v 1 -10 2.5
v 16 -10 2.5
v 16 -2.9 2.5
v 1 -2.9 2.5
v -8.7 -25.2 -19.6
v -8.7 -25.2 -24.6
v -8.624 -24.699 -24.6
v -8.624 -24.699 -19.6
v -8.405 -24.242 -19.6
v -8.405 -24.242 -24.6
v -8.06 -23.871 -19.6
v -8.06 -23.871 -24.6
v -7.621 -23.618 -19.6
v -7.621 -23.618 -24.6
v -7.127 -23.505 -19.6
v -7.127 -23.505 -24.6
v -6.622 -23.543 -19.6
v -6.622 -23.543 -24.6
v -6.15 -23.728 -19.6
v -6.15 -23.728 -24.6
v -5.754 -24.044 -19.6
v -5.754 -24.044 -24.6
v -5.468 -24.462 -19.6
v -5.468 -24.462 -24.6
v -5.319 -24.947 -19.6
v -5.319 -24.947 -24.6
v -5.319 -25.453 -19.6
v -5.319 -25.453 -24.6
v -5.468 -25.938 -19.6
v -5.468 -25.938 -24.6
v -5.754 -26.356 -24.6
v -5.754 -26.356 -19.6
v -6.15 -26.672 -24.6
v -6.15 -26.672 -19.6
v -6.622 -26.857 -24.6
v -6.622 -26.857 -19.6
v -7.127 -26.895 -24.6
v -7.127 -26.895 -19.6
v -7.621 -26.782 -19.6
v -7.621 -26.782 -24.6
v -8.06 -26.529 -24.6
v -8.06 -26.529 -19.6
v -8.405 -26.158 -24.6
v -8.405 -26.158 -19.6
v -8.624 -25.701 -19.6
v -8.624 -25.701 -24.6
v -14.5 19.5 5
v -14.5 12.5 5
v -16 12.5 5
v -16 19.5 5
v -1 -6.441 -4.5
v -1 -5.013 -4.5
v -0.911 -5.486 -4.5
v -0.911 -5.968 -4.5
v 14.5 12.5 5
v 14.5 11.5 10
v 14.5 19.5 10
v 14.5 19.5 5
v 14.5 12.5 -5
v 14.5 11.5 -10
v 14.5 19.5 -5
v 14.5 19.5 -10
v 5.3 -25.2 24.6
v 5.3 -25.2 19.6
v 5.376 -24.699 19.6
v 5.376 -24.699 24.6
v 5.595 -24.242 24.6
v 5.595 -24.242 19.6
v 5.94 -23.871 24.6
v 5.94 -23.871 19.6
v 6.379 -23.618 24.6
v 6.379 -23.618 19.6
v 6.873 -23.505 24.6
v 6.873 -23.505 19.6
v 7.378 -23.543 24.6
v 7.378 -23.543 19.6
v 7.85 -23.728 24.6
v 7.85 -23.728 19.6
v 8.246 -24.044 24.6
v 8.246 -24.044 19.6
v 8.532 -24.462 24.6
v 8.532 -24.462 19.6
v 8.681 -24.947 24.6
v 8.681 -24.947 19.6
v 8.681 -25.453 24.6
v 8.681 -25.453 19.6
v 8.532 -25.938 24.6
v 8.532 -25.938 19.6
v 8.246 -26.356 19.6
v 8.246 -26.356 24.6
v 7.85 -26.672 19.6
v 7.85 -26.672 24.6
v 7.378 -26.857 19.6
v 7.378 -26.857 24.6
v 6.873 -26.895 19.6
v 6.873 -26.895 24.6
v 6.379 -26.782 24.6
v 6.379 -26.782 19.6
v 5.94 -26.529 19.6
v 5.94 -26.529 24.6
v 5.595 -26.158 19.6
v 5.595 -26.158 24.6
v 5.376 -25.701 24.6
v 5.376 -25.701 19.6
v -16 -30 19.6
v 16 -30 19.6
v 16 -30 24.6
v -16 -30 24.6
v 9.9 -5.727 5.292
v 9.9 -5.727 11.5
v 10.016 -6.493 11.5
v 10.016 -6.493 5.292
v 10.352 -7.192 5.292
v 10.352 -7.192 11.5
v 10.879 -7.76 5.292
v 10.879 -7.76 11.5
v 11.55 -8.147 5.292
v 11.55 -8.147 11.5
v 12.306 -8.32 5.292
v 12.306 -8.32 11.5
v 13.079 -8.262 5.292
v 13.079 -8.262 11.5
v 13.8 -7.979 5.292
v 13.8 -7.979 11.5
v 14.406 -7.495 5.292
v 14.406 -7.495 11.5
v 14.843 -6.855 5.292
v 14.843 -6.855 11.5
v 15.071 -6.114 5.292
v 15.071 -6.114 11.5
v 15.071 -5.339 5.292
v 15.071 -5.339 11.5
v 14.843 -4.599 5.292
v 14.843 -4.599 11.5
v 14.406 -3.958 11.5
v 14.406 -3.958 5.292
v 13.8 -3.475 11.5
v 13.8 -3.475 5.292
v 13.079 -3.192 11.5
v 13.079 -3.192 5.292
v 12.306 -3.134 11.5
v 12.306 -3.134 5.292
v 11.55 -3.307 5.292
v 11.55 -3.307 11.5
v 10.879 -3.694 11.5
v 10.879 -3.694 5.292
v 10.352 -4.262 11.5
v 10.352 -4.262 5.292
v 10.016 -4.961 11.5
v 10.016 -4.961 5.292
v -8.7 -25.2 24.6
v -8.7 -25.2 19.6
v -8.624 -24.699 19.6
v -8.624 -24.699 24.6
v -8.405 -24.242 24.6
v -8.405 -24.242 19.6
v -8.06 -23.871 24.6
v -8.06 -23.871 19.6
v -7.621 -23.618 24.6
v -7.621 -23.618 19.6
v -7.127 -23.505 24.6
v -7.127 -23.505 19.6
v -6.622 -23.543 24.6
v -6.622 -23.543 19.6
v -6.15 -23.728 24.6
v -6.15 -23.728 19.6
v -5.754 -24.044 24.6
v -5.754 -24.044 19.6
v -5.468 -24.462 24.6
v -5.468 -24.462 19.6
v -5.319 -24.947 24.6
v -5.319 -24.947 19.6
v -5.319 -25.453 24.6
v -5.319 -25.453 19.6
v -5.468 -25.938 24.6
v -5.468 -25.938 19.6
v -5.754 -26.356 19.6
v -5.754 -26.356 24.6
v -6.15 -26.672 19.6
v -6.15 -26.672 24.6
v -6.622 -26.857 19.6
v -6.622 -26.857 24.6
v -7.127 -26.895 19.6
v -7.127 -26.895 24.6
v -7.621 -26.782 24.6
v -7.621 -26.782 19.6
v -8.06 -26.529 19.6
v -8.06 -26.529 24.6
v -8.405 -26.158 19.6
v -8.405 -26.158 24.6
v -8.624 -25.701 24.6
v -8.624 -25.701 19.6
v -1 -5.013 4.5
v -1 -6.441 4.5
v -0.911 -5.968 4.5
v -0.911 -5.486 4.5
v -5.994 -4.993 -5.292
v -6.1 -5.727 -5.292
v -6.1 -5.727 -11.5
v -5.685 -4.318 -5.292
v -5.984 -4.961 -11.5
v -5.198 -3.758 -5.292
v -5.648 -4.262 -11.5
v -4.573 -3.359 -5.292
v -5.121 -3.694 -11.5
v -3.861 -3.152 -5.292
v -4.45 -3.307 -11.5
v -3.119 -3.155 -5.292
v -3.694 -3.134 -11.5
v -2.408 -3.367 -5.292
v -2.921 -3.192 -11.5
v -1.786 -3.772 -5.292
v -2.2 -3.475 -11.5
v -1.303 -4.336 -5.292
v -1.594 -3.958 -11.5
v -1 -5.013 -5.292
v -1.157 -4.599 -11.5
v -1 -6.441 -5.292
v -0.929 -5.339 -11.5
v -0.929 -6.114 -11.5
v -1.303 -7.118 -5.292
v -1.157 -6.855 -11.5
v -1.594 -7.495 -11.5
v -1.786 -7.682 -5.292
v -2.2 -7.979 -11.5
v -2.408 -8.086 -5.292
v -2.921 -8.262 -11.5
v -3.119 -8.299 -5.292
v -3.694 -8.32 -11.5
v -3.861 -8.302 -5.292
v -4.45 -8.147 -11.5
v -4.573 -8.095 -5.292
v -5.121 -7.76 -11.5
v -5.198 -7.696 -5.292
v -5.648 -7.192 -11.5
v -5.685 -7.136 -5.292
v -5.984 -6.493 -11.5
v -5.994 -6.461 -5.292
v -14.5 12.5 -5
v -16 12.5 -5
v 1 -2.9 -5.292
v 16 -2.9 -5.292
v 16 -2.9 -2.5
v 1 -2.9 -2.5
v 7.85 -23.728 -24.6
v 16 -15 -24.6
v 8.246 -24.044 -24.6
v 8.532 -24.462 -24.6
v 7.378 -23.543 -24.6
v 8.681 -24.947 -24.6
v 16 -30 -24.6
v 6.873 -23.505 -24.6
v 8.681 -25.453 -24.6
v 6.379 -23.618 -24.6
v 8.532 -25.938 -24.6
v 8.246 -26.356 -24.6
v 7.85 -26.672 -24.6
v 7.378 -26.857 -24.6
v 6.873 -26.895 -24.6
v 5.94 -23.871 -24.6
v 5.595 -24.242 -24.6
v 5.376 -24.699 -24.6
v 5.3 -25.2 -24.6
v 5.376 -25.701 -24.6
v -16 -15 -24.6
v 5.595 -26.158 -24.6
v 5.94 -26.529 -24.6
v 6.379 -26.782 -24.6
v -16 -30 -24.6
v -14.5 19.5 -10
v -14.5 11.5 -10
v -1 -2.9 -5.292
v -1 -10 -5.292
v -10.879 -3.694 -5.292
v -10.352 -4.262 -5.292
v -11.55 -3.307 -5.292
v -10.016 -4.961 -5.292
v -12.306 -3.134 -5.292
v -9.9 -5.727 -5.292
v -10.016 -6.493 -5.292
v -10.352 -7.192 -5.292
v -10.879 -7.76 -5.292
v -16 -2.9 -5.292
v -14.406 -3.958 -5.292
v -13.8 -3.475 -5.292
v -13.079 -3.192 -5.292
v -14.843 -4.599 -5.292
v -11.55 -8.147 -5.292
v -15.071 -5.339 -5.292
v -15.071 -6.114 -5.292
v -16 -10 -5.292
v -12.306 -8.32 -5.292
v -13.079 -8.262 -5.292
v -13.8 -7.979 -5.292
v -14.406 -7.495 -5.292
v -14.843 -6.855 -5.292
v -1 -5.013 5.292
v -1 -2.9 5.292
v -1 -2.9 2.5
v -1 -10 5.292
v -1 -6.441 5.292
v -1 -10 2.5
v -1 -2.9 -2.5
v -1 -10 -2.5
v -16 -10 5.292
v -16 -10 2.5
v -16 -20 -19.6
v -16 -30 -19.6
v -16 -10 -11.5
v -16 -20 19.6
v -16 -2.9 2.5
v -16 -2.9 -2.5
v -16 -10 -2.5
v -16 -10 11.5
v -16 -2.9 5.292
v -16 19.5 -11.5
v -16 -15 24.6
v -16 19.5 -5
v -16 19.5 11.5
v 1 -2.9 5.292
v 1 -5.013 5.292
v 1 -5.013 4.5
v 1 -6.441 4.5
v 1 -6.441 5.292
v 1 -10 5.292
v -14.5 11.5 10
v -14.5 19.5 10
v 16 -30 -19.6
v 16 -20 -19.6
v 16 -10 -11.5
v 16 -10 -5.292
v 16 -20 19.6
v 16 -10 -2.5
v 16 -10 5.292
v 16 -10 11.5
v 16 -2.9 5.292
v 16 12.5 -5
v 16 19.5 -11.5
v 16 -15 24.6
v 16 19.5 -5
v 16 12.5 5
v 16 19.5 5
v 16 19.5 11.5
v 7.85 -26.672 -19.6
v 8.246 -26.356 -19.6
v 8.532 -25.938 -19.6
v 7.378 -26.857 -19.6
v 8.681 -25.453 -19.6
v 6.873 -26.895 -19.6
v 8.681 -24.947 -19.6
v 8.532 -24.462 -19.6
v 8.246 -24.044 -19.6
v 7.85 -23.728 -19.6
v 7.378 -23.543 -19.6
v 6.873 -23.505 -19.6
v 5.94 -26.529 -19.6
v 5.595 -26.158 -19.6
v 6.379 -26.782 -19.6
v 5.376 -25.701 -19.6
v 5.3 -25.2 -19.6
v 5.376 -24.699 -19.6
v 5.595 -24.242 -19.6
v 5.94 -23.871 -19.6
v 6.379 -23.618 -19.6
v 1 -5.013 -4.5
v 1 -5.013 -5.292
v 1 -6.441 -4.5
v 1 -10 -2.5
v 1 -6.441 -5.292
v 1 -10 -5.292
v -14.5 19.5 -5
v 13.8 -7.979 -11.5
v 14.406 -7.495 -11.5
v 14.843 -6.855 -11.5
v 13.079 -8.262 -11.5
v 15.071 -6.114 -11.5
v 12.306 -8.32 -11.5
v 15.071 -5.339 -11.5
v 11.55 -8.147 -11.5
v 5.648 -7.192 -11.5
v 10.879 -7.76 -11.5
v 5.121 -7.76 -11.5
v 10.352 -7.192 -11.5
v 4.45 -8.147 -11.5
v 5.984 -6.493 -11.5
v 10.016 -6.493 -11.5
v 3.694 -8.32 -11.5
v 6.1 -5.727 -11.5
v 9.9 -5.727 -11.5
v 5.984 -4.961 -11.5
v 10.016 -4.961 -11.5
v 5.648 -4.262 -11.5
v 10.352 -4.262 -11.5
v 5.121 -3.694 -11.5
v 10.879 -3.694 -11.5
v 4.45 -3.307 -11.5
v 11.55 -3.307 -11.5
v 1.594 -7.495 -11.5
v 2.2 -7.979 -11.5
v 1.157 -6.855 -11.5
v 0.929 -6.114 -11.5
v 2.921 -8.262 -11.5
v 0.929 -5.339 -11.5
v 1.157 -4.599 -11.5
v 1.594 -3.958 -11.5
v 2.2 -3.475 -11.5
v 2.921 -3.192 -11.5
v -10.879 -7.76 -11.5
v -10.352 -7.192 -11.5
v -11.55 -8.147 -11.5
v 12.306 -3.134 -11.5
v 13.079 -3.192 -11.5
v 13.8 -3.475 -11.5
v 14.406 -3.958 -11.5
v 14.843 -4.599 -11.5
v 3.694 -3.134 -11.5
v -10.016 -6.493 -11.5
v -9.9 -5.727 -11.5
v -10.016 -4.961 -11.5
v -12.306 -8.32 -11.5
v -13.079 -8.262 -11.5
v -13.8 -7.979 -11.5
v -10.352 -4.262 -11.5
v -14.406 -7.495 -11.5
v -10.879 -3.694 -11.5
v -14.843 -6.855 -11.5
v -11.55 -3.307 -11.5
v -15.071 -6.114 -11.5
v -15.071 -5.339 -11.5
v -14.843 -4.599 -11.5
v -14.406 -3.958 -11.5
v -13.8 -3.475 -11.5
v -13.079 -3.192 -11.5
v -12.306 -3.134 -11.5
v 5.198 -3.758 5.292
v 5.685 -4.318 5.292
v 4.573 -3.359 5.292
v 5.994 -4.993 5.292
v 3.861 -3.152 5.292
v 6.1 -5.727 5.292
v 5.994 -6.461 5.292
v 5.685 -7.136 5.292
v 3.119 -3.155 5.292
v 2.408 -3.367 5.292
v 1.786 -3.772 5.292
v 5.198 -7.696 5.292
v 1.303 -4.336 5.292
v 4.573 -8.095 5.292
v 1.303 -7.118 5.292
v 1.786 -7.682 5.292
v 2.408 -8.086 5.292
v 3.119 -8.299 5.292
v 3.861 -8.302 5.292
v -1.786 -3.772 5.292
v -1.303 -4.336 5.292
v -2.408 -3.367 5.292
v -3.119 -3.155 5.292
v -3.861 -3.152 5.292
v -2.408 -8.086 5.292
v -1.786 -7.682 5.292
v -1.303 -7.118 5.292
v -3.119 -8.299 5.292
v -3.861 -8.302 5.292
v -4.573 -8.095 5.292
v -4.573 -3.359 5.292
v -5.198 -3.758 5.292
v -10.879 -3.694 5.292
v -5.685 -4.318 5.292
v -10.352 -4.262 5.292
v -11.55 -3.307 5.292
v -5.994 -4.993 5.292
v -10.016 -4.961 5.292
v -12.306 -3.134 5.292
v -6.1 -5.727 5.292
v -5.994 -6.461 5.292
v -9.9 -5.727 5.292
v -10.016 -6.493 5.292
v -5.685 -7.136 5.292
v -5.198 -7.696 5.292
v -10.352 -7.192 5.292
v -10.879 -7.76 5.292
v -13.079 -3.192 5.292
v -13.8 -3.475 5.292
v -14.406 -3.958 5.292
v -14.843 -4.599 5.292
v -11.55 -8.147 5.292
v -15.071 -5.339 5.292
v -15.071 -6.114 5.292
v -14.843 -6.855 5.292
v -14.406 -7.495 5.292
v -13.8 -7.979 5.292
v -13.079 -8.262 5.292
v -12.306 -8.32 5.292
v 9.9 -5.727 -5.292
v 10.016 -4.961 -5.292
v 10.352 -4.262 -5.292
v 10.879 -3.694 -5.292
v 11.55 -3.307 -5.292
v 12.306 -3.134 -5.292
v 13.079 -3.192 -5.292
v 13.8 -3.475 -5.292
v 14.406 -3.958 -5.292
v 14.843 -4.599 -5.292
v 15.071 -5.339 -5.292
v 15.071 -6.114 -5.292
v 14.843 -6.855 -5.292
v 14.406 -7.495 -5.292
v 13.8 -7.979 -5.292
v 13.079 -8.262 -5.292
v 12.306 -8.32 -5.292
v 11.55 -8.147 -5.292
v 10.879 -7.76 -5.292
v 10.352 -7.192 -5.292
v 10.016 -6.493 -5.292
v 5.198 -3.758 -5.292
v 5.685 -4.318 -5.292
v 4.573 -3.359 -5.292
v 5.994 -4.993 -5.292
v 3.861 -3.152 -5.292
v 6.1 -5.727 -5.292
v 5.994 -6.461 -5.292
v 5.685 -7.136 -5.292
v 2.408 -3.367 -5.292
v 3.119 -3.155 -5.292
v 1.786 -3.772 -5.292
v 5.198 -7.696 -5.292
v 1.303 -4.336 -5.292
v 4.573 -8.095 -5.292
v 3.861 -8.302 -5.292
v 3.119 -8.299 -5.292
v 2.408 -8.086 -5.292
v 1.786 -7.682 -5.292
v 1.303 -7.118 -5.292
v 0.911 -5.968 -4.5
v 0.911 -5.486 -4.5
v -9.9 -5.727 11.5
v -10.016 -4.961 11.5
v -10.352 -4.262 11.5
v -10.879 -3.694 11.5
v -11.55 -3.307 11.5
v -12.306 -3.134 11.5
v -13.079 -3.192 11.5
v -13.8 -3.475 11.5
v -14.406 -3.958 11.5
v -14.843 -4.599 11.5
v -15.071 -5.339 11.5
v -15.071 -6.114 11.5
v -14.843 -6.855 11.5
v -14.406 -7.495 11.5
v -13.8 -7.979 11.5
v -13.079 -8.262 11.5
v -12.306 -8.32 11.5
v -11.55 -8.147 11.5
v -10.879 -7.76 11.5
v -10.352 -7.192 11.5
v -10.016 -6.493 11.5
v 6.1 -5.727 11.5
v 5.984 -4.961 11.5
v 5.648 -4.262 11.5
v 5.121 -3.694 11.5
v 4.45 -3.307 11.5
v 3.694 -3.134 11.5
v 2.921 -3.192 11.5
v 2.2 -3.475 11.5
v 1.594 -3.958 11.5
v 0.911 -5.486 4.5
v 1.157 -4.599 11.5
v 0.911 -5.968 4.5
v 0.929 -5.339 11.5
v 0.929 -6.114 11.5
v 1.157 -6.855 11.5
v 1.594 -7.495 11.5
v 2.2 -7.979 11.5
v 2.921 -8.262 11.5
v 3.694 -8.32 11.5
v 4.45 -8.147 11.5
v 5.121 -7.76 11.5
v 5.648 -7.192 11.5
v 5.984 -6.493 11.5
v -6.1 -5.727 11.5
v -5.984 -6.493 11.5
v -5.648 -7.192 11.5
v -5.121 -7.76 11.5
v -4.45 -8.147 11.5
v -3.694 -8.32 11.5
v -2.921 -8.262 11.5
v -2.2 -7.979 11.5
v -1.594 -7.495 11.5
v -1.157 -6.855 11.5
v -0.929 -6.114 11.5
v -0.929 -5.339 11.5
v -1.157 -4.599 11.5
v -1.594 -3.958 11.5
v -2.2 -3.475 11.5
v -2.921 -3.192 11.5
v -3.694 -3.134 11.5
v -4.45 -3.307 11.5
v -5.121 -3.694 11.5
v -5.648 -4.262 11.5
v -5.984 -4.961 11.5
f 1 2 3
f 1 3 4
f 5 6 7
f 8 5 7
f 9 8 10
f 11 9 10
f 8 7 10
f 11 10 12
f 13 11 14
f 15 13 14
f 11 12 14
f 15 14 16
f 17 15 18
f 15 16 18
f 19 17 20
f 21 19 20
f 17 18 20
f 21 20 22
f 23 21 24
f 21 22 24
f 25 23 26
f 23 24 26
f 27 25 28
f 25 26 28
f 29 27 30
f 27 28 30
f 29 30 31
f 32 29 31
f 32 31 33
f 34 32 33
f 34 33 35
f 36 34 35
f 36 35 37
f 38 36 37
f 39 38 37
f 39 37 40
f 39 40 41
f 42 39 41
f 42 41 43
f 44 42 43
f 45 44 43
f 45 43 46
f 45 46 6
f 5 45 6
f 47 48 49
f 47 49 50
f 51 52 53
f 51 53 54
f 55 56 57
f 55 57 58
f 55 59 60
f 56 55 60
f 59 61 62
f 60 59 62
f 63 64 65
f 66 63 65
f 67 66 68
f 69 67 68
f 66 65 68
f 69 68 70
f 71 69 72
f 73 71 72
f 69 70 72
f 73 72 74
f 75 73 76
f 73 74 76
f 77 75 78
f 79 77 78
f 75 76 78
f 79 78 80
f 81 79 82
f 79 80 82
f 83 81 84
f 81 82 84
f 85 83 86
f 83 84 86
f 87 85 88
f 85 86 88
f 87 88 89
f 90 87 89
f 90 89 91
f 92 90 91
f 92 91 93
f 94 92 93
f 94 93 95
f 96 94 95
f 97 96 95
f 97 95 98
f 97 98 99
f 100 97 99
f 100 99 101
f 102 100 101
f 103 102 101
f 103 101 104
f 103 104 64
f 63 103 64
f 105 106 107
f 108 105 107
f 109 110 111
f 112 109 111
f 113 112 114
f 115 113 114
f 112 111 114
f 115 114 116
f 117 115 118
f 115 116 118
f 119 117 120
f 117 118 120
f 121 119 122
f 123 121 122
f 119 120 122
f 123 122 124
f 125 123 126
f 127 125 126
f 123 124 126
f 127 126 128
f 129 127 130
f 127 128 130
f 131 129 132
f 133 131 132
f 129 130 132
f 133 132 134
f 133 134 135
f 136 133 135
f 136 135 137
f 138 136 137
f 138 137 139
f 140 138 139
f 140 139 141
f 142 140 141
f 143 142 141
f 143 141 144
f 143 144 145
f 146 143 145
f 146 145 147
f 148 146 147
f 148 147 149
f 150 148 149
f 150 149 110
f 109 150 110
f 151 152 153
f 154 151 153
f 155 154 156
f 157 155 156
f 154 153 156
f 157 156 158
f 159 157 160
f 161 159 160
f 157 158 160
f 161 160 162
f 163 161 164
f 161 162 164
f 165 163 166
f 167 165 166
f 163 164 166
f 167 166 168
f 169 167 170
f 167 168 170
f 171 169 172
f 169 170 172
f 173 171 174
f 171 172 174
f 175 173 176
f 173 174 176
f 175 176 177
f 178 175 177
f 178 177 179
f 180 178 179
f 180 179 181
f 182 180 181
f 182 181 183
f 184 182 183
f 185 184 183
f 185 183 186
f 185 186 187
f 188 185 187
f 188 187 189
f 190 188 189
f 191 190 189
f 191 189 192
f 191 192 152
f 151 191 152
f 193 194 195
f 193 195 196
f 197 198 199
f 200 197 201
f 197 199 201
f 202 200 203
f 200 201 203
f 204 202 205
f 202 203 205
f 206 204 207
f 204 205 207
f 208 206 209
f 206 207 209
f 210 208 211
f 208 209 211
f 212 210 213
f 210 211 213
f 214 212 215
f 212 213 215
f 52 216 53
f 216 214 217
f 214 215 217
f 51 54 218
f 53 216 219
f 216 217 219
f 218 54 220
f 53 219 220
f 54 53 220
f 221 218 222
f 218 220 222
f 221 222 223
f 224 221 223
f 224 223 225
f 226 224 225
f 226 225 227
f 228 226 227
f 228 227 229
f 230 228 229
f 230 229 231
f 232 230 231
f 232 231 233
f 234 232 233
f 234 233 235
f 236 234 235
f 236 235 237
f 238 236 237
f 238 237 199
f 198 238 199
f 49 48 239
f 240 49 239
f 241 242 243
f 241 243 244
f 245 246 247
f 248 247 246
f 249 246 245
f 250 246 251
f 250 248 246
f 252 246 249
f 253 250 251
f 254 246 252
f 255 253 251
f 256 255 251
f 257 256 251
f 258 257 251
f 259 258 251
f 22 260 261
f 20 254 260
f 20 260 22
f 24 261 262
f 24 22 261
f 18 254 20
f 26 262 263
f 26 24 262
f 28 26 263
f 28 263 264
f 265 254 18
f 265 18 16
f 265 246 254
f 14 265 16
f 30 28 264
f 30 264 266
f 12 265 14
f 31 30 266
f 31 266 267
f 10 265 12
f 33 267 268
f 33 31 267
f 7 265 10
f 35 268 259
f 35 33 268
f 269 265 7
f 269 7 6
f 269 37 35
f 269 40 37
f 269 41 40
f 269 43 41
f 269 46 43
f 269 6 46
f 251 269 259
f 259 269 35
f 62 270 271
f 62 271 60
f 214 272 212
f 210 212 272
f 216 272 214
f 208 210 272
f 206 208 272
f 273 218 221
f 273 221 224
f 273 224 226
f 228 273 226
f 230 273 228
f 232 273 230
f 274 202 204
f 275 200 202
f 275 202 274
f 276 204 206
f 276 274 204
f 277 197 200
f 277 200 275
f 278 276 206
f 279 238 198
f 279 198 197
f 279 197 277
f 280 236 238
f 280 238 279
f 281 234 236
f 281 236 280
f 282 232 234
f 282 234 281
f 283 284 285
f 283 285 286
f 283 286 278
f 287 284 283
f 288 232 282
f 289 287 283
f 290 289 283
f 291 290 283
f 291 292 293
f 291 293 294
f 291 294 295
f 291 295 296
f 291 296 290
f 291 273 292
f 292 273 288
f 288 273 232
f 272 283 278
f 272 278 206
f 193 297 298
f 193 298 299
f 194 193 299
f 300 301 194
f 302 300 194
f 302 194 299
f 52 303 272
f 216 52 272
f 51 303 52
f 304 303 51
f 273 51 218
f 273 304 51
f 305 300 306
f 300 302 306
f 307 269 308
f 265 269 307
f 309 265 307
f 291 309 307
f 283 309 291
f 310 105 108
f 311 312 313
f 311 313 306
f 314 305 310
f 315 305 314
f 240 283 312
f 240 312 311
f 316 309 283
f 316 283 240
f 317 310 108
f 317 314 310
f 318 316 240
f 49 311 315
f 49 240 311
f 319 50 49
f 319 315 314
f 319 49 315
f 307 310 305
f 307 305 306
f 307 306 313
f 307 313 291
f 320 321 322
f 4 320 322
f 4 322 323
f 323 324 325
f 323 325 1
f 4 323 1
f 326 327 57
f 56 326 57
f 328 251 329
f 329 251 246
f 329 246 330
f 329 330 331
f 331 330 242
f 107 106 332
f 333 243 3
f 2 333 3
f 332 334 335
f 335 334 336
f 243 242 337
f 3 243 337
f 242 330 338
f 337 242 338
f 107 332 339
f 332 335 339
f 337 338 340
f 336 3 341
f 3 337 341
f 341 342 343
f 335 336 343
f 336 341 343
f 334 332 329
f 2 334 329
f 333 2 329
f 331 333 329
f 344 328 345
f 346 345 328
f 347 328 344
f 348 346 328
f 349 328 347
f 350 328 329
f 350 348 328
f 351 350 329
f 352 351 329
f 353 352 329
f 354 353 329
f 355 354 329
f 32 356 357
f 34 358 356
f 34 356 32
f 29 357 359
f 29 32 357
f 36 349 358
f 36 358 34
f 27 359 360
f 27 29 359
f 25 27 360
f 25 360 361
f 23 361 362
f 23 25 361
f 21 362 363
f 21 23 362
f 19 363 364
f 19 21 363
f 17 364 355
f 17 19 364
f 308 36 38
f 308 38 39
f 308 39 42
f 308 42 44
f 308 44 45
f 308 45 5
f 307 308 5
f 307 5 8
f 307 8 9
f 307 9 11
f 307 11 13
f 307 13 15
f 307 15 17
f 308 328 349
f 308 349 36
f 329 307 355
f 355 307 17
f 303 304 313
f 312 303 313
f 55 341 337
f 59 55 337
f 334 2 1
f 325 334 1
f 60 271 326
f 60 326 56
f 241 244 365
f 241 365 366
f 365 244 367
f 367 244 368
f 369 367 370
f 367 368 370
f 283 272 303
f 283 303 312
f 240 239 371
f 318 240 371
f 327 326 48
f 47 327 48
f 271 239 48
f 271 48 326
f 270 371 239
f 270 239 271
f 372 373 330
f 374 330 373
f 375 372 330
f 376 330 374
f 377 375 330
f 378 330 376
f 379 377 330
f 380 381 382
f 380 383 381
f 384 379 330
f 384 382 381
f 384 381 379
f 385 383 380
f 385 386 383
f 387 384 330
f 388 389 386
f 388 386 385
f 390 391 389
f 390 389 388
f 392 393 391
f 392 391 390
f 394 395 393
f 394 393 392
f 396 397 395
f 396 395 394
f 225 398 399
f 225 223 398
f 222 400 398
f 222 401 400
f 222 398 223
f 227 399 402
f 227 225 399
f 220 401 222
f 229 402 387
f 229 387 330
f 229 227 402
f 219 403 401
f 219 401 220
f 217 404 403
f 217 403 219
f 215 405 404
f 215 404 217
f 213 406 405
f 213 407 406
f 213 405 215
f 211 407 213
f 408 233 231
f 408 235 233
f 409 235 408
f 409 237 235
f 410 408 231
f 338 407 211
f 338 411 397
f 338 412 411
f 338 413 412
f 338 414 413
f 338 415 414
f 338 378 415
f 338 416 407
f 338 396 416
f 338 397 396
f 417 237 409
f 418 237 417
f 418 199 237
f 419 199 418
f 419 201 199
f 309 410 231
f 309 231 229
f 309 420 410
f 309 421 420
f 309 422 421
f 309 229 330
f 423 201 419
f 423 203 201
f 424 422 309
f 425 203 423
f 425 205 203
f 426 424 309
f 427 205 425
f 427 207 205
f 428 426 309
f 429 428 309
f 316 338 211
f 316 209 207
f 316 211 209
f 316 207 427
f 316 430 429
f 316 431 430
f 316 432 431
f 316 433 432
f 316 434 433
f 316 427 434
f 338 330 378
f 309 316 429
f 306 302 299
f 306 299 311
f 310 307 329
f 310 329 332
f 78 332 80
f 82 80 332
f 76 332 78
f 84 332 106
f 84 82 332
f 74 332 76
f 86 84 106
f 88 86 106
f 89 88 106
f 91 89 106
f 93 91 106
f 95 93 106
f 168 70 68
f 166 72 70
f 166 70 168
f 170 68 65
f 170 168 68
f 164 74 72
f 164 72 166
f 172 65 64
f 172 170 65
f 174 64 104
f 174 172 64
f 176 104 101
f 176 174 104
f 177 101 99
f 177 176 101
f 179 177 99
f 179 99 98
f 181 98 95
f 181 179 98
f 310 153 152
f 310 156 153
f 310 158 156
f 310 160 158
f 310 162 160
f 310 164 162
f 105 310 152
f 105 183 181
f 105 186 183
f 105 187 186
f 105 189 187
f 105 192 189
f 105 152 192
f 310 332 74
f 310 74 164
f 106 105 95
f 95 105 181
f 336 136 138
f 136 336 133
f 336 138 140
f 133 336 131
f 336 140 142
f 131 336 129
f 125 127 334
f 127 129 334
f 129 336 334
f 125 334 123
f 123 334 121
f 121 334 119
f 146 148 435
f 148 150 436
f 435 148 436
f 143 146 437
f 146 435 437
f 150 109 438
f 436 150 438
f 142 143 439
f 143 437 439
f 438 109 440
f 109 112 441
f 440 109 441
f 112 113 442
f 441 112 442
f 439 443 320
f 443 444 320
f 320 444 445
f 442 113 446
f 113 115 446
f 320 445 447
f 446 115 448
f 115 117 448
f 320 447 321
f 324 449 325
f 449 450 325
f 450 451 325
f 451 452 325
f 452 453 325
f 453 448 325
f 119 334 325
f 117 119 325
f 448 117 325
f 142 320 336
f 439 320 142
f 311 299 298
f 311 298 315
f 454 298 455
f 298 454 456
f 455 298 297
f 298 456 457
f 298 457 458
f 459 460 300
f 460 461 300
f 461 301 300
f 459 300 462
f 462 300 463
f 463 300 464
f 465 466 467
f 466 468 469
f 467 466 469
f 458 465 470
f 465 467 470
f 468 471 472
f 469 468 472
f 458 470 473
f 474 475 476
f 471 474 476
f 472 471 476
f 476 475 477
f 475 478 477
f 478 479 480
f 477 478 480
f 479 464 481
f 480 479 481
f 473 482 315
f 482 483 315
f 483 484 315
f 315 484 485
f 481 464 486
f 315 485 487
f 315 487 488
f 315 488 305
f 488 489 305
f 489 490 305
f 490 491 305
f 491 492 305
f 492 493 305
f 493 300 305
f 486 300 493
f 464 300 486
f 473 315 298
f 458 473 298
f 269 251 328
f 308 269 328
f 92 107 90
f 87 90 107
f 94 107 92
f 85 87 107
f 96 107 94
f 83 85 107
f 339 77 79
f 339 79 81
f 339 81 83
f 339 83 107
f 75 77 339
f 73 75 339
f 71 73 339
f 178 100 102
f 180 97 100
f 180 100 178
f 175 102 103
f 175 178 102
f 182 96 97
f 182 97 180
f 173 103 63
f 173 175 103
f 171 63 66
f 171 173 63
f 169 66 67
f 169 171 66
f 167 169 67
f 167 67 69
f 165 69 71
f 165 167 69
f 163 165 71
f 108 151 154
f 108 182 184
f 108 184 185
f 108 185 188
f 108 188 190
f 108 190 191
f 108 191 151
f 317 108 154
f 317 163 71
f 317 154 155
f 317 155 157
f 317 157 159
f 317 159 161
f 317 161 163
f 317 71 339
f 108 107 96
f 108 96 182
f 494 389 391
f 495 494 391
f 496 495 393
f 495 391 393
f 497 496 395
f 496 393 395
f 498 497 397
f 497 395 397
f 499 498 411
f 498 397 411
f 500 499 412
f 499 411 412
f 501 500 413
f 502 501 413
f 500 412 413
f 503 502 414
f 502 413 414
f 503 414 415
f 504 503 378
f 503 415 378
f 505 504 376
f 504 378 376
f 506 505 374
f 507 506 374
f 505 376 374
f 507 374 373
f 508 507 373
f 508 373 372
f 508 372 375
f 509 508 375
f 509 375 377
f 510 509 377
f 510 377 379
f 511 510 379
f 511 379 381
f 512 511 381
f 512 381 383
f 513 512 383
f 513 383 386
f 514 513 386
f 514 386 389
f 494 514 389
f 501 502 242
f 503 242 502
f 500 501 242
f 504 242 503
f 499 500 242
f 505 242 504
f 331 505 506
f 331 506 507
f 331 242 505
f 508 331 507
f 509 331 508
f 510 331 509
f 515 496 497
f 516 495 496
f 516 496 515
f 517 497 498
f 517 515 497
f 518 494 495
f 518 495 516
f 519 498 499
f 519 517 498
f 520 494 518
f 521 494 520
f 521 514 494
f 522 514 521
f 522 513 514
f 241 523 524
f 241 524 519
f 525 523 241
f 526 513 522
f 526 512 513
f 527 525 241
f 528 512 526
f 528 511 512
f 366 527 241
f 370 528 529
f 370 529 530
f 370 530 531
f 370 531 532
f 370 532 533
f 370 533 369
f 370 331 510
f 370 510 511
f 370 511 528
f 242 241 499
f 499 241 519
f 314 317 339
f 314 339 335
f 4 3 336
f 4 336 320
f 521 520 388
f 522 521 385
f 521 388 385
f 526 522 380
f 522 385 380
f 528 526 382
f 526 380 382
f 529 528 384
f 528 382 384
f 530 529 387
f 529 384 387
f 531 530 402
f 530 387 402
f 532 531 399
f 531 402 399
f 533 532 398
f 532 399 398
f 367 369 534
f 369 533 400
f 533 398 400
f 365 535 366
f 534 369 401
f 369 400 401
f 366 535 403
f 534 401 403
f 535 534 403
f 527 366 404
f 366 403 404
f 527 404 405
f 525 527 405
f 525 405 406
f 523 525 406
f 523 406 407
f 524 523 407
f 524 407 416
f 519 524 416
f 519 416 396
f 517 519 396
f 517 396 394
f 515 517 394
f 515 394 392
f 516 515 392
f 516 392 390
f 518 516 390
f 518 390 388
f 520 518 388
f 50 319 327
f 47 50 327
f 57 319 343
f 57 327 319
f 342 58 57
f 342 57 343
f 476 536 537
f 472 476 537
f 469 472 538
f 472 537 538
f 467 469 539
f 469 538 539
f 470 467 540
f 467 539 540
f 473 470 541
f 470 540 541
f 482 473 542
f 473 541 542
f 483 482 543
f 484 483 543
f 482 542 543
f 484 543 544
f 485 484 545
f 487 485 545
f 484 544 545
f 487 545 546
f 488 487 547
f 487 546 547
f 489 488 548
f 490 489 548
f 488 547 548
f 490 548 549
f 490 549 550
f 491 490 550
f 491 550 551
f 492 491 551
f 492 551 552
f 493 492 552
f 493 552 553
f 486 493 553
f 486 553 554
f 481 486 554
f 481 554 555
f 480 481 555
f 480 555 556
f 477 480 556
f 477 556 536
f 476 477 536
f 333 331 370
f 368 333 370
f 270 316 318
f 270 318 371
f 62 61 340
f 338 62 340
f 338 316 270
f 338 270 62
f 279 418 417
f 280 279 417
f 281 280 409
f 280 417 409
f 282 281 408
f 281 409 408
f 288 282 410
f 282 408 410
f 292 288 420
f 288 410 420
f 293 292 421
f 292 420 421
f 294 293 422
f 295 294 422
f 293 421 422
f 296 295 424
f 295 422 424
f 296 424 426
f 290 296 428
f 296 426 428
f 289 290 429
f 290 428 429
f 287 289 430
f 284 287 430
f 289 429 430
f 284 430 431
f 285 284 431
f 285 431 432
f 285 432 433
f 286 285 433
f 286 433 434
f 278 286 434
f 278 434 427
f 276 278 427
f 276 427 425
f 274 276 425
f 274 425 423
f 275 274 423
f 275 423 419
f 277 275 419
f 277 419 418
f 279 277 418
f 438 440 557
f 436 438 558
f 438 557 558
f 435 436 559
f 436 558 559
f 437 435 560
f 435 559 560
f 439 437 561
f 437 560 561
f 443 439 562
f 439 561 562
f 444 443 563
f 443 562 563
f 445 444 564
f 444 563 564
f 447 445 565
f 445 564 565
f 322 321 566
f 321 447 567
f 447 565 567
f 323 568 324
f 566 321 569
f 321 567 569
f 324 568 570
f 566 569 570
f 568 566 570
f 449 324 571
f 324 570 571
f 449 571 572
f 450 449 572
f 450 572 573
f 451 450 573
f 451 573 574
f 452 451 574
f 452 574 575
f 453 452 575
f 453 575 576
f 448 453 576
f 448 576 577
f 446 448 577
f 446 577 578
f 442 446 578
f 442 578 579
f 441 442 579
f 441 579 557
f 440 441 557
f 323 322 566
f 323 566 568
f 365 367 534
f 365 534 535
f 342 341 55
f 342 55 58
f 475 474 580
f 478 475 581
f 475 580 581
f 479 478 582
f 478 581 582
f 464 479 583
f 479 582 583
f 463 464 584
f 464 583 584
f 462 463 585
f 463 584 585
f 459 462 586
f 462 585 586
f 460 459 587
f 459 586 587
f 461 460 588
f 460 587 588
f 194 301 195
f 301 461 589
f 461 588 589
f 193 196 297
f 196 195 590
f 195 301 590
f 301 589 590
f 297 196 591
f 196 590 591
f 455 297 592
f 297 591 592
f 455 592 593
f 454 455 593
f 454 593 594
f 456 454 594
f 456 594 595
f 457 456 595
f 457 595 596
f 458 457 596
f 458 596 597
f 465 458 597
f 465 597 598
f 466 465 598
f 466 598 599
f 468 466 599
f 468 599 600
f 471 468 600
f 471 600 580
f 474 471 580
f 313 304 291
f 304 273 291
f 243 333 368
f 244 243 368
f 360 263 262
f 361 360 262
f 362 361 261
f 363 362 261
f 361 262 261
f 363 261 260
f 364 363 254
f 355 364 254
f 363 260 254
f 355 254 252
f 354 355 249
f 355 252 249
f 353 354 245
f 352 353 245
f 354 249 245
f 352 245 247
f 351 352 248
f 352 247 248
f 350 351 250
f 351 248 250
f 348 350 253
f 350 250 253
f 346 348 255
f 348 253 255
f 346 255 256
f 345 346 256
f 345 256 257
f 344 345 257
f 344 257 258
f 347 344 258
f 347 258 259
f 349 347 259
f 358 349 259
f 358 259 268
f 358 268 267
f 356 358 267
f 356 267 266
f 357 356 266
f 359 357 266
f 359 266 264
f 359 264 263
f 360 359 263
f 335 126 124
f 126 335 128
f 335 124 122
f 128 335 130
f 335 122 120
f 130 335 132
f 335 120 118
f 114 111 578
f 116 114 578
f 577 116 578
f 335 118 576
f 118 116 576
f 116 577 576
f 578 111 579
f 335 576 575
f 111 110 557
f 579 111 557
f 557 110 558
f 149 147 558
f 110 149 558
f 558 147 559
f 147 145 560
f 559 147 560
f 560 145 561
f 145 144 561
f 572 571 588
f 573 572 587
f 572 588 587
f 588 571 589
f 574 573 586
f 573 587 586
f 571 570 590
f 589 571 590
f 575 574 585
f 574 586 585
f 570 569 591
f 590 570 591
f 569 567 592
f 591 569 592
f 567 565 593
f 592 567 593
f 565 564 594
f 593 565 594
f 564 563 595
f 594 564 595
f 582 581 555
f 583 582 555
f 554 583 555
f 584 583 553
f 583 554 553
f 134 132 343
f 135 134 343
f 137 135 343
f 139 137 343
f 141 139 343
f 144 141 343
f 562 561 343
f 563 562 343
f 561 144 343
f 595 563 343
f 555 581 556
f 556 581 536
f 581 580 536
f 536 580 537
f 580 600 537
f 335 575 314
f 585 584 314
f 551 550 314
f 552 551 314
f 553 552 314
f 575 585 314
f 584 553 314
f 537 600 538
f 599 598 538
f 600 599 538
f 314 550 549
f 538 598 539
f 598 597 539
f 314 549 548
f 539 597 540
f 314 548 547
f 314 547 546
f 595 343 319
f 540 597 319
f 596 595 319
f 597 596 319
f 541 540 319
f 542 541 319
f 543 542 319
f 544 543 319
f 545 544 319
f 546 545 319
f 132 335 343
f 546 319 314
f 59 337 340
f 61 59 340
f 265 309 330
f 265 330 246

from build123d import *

# Parameters (mm, degrees)
SKETCH4_W           = 32
SKETCH4_H           = 23
BOSS_EXTRUDE3_DEPTH = 19.5
SKETCH5_W           = 29
SKETCH5_H           = 20
CUT_EXTRUDE2_DEPTH  = 8
SKETCH7_W           = 10
SKETCH7_H           = 7
CUT_EXTRUDE4_DEPTH  = 40.198214245
SKETCH8_W           = 32
SKETCH8_H           = 23
BOSS_EXTRUDE4_DEPTH = 10
SKETCH12_R          = 2.6
CUT_EXTRUDE5_DEPTH  = 7
CIRPATTERN1_COUNT   = 2
CIRPATTERN1_ANGLE   = 180
SKETCH13_W          = 15
SKETCH13_H          = 2.791622882
CUT_EXTRUDE6_DEPTH  = 7.1
SKETCH14_W          = 32
SKETCH14_H          = 23
BOSS_EXTRUDE5_DEPTH = 5
BOSS_EXTRUDE6_DEPTH = 32
SKETCH16_R          = 1.7
CUT_EXTRUDE7_DEPTH  = 60.805016512


with BuildPart() as part:
    # Sketch4 → Boss-Extrude3 (new body)
    with BuildSketch(Plane(origin=(0, 0, 0), x_dir=(1, 0, 0), z_dir=(0, 1, 0))):
        Rectangle(SKETCH4_W, SKETCH4_H)
    extrude(amount=BOSS_EXTRUDE3_DEPTH)

    # Sketch5 → Cut-Extrude2 (cut)
    with BuildSketch(Plane(origin=(0, 19.5, 0), x_dir=(1, 0, 0), z_dir=(0, 1, 0))):
        Rectangle(SKETCH5_W, SKETCH5_H)
    extrude(amount=-CUT_EXTRUDE2_DEPTH, mode=Mode.SUBTRACT)

    # Sketch7 → Cut-Extrude4 (cut, through all)
    with BuildSketch(Plane(origin=(16, 0, 0), x_dir=(0, 0, -1), z_dir=(1, 0, 0))):
        with Locations((0, 16)):
            Rectangle(SKETCH7_W, SKETCH7_H)
    extrude(amount=-CUT_EXTRUDE4_DEPTH, mode=Mode.SUBTRACT)

    # Sketch8 → Boss-Extrude4 (add)
    with BuildSketch(Plane(origin=(0, 0, 0), x_dir=(-1, 0, 0), z_dir=(0, -1, 0))):
        Rectangle(SKETCH8_W, SKETCH8_H)
    extrude(amount=BOSS_EXTRUDE4_DEPTH)

    # Sketch12 → Cut-Extrude5 (cut)
    with BuildSketch(Plane(origin=(0, 0, -11.5), x_dir=(-1, 0, 0), z_dir=(0, 0, -1))):
        with Locations((-12.5, -5.726898225)):
            Circle(SKETCH12_R)
        with Locations(Location((-3.5, -5.726898225, 0), (0, 0, 180))):
            Circle(SKETCH12_R)
        with Locations((3.5, -5.726898225)):
            Circle(SKETCH12_R)
        with Locations(Location((12.5, -5.726898225, 0), (0, 0, 180))):
            Circle(SKETCH12_R)
    cut_extrude5 = extrude(amount=-CUT_EXTRUDE5_DEPTH, mode=Mode.SUBTRACT)

    # CirPattern1: Cut-Extrude5 ×2 about axis
    cirpattern1_axis = Axis((0, 11.5, 0), (0, -1, 0))
    for i in range(1, CIRPATTERN1_COUNT):
        add(cut_extrude5.rotate(cirpattern1_axis, i * CIRPATTERN1_ANGLE / (CIRPATTERN1_COUNT - 1)), mode=Mode.SUBTRACT)

    # Sketch13 → Cut-Extrude6 (cut)
    with BuildSketch(Plane(origin=(0, -10, 0), x_dir=(-1, 0, 0), z_dir=(0, -1, 0))):
        with Locations((8.5, 3.895811441)):
            Rectangle(SKETCH13_W, SKETCH13_H)
        with Locations((-8.5, 3.895811441)):
            Rectangle(SKETCH13_W, SKETCH13_H)
        with Locations((-8.5, -3.895811441)):
            Rectangle(SKETCH13_W, SKETCH13_H)
        with Locations((8.5, -3.895811441)):
            Rectangle(SKETCH13_W, SKETCH13_H)
    extrude(amount=-CUT_EXTRUDE6_DEPTH, mode=Mode.SUBTRACT)

    # Sketch14 → Boss-Extrude5 (add)
    with BuildSketch(Plane(origin=(0, -10, 0), x_dir=(-1, 0, 0), z_dir=(0, -1, 0))):
        Rectangle(SKETCH14_W, SKETCH14_H)
    extrude(amount=BOSS_EXTRUDE5_DEPTH)

    # Sketch15 → Boss-Extrude6 (add)
    with BuildSketch(Plane.ZY.offset(16)):
        Polygon((-24.6, -15), (-24.6, -30), (-19.6, -30), (-19.6, -20), (19.6, -20), (19.6, -30), (24.6, -30), (24.6, -15), (11.5, -10), (11.5, -15), (-11.5, -15), (-11.5, -10), align=None)
    extrude(amount=-BOSS_EXTRUDE6_DEPTH)

    # Sketch16 → Cut-Extrude7 (cut, through all)
    with BuildSketch(Plane(origin=(0, 0, -24.6), x_dir=(-1, 0, 0), z_dir=(0, 0, -1))):
        with Locations((7, -25.2)):
            Circle(SKETCH16_R)
        with Locations((-7, -25.2)):
            Circle(SKETCH16_R)
    extrude(amount=-CUT_EXTRUDE7_DEPTH, mode=Mode.SUBTRACT)


solid = part.part
